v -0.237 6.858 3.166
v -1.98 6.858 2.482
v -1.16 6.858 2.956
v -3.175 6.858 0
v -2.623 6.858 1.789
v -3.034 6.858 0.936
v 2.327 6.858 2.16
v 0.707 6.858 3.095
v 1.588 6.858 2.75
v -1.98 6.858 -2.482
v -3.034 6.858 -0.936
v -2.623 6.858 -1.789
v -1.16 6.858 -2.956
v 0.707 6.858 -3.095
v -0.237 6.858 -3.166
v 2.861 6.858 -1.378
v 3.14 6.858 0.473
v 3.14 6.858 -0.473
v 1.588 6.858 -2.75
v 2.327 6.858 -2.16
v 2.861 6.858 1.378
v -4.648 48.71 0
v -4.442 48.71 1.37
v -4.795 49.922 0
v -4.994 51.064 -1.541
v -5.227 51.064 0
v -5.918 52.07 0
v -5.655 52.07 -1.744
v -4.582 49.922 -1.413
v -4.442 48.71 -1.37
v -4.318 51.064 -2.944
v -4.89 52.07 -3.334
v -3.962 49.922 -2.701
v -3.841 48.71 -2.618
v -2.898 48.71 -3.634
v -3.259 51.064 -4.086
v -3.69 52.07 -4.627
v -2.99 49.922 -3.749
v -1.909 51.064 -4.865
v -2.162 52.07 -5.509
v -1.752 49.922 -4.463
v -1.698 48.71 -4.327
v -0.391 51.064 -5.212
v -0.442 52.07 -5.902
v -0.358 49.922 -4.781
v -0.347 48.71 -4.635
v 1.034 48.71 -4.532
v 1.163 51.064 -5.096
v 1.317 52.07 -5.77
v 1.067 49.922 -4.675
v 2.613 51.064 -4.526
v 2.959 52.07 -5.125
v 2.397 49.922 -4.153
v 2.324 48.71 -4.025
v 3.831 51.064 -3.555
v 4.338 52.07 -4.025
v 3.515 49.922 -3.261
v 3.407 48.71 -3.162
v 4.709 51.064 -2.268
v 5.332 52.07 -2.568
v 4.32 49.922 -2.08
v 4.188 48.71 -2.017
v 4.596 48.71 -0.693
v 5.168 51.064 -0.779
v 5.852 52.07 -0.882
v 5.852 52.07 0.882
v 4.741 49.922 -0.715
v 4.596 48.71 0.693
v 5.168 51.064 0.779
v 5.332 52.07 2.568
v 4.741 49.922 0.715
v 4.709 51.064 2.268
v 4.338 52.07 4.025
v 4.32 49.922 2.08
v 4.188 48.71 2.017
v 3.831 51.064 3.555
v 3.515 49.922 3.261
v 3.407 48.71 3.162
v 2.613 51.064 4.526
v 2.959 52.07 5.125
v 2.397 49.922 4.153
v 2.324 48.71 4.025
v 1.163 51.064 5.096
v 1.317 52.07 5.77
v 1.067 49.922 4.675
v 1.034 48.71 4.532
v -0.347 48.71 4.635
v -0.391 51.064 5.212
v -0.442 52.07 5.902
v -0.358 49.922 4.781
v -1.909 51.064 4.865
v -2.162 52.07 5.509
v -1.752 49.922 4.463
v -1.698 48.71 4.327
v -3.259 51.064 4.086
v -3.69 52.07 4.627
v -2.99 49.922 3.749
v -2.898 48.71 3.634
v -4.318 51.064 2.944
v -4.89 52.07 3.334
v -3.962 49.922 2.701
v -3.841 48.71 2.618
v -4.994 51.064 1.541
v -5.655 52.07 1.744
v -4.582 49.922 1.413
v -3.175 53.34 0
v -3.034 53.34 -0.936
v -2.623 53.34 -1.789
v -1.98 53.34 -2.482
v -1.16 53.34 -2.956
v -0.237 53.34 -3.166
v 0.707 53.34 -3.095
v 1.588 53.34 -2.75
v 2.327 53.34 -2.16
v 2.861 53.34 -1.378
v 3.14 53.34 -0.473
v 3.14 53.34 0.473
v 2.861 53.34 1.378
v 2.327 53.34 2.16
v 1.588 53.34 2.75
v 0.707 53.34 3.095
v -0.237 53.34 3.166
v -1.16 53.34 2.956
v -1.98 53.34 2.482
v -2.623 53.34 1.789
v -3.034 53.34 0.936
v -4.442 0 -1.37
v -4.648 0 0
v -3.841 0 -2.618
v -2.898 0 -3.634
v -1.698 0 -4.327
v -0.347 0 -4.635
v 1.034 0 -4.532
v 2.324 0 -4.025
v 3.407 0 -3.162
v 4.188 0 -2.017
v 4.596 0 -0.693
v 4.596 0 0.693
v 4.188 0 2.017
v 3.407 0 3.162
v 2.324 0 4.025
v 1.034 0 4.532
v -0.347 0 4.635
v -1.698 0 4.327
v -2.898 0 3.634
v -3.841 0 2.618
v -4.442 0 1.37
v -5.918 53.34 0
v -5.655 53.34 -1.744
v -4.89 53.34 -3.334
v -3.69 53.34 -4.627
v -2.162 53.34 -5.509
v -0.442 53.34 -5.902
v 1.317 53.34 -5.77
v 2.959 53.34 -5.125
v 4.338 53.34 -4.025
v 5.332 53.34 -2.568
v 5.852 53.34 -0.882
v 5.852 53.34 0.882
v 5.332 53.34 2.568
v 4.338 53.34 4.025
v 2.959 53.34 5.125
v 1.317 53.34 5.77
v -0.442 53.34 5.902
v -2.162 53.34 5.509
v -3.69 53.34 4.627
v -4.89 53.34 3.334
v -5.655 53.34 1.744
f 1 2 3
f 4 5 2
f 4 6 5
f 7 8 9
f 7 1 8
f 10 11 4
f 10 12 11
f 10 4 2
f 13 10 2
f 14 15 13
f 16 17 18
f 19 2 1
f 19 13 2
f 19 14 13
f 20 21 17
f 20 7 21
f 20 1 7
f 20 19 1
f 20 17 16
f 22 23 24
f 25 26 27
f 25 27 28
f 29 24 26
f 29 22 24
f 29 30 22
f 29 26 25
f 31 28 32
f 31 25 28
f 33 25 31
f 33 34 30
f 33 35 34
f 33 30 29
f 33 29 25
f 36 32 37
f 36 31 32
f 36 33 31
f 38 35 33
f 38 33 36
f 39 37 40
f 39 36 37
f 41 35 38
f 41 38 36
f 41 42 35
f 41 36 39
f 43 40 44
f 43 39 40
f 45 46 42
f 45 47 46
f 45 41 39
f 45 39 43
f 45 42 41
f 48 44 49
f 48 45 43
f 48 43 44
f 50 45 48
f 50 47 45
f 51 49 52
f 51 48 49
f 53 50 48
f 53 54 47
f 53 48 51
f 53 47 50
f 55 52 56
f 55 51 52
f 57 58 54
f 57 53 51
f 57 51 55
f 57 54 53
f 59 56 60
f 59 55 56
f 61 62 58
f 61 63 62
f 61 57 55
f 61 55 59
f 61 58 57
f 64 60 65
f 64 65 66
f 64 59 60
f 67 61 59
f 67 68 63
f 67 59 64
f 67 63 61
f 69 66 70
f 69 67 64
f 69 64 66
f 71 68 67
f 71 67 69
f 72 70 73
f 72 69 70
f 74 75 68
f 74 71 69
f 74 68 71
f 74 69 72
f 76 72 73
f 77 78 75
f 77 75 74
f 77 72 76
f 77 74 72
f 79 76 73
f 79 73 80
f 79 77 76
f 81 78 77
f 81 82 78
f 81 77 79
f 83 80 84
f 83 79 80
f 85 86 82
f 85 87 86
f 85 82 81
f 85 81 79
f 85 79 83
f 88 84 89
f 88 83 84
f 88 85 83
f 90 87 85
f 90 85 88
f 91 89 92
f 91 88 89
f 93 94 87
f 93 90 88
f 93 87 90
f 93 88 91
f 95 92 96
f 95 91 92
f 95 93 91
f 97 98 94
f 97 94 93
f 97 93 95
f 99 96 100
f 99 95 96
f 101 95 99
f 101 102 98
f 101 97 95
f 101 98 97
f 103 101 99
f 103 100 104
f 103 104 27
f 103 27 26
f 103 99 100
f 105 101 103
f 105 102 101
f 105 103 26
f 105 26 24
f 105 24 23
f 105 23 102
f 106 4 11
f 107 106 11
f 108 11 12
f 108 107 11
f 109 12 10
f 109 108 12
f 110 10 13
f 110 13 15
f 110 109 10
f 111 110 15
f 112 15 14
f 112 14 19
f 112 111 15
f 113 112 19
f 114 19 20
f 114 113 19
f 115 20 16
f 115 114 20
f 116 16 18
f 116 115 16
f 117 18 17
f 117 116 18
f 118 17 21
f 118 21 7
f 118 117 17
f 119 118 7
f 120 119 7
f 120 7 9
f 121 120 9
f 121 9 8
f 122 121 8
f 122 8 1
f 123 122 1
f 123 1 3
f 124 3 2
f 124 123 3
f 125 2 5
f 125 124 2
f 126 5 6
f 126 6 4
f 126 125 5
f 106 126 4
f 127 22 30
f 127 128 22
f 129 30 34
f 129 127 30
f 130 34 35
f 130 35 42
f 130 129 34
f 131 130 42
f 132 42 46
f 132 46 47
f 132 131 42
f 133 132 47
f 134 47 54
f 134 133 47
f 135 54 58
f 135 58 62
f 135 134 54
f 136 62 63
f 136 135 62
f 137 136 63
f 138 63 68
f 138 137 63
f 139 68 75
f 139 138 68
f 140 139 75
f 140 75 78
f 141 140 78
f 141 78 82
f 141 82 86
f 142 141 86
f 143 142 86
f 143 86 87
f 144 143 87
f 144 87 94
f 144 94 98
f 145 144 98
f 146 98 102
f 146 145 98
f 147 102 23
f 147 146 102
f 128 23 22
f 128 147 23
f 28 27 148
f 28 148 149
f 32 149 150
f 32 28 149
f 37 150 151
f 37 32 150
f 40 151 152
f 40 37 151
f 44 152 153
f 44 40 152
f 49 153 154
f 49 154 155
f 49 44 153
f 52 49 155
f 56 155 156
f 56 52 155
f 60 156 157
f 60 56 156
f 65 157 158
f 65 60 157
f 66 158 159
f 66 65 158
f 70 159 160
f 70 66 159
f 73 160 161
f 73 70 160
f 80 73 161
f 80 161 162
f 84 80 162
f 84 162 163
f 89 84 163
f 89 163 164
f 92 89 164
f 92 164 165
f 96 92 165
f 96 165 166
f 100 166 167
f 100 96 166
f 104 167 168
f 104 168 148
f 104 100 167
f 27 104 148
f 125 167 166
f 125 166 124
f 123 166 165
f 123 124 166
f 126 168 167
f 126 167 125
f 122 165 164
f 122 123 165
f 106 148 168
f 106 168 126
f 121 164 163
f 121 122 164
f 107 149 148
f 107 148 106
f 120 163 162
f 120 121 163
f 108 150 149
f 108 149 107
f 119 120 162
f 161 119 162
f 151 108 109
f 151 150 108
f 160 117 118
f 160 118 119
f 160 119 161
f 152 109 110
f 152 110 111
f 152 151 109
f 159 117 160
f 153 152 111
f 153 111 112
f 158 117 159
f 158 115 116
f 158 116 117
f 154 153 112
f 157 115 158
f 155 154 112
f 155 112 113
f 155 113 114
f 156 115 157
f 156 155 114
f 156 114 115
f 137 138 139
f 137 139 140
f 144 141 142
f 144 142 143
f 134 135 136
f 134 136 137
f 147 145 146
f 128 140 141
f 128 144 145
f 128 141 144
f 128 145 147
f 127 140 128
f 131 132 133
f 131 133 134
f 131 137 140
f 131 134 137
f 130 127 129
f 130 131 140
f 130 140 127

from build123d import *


# Not quite as in the source:
# - a fillet or chamfer that OpenCascade refuses, or shapes differently, is made with other operations: its cross-section is extruded or revolved along the edge and cut away or added


with BuildPart() as f1:
    # F0 (on Top) → F1 (revolve)
    with BuildSketch(Plane.XY):
        Polygon((-4.6482, 0), (0, 0), (0, 6.8579994701), (-3.175, 6.8579994701), (-3.175, 53.34), (-4.6482, 53.34), (-5.9182, 53.34), (-5.9182, 52.07), (-4.6482, 52.07), align=None)
    revolve(axis=Axis((0, 3.4289997351, 0), (0, -1, 0)))

    # F2: fillet of radius 5.08 on 1 edges, made by hand

    # F2_s1 → F2_t2 (revolve)
    with BuildSketch(Plane.XY):
        with BuildLine():
            ThreePointArc((-5.9182, 52.07), (-4.9762951188, 50.5059470592), (-4.6482, 48.7098958349))
            Line((-4.6482, 48.7098958349), (-4.6482, 52.07))
            Line((-4.6482, 52.07), (-5.9182, 52.07))
        make_face()
    revolve(axis=Axis((0, 52.07, 0), (0, -1, 0)))


solid = f1.part
